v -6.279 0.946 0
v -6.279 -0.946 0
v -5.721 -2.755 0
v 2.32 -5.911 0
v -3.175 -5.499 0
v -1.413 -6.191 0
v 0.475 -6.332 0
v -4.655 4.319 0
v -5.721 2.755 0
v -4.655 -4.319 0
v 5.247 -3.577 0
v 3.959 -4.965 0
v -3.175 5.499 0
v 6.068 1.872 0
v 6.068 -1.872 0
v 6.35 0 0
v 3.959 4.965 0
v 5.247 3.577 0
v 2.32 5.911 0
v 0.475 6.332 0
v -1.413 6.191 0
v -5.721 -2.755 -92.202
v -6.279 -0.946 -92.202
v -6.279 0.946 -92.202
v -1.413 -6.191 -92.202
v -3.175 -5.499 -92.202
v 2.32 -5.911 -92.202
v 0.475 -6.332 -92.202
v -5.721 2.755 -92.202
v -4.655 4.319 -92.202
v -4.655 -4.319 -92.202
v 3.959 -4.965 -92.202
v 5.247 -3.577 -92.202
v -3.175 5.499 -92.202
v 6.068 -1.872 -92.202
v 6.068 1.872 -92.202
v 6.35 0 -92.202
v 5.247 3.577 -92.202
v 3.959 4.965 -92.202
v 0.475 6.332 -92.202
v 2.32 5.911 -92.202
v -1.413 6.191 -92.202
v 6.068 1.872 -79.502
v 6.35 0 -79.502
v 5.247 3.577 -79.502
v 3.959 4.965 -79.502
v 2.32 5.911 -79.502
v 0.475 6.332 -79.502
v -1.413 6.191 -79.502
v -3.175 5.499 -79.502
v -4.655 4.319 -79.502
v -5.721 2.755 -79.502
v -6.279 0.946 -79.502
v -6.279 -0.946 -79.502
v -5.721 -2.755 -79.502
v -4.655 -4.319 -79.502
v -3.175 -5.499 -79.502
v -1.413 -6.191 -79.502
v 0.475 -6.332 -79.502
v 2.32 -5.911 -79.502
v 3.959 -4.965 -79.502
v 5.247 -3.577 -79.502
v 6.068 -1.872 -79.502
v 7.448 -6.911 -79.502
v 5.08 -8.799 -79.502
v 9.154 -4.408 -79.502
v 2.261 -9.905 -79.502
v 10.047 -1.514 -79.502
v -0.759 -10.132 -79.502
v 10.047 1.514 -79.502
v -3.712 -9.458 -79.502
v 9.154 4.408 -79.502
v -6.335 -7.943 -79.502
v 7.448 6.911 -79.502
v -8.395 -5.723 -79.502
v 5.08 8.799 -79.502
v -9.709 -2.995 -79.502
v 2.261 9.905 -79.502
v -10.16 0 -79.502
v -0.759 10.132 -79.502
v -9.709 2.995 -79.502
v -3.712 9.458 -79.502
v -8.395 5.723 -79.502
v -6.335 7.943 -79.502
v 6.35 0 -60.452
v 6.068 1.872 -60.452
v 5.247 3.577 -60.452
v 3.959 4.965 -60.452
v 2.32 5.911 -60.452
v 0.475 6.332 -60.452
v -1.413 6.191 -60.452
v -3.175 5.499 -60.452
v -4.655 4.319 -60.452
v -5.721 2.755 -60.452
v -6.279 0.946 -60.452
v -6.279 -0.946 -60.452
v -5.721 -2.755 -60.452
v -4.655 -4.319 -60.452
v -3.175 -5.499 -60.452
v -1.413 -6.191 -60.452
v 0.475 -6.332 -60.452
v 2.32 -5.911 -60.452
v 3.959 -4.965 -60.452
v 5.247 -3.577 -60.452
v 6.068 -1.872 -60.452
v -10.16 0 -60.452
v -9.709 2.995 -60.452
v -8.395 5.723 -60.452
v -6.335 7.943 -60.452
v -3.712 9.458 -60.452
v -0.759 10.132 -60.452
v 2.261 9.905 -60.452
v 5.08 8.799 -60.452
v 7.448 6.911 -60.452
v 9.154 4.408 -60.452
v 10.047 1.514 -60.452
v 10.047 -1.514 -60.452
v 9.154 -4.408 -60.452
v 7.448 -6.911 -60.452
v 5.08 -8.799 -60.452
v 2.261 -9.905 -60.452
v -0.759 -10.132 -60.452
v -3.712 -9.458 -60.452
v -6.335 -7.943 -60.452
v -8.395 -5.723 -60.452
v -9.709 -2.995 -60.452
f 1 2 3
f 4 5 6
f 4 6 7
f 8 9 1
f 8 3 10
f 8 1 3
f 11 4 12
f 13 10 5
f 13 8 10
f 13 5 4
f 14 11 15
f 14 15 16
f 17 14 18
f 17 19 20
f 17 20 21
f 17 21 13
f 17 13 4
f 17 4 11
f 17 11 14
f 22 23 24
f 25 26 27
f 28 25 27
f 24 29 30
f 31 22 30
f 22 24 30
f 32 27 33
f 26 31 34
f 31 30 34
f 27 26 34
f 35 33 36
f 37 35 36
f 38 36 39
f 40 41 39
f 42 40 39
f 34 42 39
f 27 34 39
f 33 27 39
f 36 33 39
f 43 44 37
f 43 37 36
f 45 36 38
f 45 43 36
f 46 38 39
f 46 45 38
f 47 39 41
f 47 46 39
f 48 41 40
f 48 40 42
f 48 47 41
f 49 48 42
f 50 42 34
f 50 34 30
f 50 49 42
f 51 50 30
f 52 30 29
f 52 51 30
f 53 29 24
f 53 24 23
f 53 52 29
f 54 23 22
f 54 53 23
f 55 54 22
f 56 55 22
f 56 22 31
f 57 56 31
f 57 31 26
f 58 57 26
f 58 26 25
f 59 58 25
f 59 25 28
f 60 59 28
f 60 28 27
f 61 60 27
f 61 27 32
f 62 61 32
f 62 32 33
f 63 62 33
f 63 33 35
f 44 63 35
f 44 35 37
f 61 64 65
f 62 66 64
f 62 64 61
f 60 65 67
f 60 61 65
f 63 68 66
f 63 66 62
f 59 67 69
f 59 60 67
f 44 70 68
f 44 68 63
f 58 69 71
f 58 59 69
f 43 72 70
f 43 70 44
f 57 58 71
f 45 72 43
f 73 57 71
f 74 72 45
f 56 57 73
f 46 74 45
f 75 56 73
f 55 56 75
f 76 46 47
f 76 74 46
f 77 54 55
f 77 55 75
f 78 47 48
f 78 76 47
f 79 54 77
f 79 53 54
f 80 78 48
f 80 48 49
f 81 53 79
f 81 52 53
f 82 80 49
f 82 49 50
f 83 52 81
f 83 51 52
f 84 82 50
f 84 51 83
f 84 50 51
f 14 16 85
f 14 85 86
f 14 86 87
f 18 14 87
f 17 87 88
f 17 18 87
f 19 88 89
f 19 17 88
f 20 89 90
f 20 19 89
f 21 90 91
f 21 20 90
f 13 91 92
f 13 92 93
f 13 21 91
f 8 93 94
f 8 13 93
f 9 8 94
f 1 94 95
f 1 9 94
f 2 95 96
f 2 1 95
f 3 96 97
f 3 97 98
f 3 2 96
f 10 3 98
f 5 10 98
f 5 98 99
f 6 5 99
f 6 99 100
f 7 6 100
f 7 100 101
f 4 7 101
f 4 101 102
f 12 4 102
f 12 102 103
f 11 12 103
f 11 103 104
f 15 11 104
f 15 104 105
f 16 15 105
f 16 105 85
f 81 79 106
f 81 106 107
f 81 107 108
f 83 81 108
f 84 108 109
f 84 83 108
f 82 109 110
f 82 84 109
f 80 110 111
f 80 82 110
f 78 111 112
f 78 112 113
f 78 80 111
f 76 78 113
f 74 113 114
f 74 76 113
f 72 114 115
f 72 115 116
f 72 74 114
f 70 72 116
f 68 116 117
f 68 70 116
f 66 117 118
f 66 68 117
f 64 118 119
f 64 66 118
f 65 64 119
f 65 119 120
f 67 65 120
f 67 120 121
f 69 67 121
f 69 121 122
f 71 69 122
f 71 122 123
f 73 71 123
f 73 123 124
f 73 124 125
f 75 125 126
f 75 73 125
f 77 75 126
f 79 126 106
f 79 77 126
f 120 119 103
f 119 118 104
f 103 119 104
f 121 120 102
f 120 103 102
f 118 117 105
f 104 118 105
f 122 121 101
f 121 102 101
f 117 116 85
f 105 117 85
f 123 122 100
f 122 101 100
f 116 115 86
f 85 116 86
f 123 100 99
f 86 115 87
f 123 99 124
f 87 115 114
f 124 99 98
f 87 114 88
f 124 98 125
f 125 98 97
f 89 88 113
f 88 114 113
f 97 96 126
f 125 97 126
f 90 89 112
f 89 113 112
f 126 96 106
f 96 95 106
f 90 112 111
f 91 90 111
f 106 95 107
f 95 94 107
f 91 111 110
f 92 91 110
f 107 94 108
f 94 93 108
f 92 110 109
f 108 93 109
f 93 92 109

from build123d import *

# Parameters (mm, degrees)
SKETCH1_R           = 6.35
BOSS_EXTRUDE1_DEPTH = 92.202
BOSS_EXTRUDE2_START = -12.7
SKETCH2_R           = 10.16
BOSS_EXTRUDE2_DEPTH = 19.05


with BuildPart() as part:
    # Sketch1 → Boss-Extrude1 (new body)
    with BuildSketch(Plane.XY):
        Circle(SKETCH1_R)
    extrude(amount=-BOSS_EXTRUDE1_DEPTH)

    # Sketch2 → Boss-Extrude2 (add)
    with BuildSketch(Plane(origin=(0, 0, -92.202), x_dir=(-1, 0, 0), z_dir=(0, 0, -1)).offset(BOSS_EXTRUDE2_START)):
        Circle(SKETCH2_R)
    extrude(amount=-BOSS_EXTRUDE2_DEPTH)


solid = part.part
